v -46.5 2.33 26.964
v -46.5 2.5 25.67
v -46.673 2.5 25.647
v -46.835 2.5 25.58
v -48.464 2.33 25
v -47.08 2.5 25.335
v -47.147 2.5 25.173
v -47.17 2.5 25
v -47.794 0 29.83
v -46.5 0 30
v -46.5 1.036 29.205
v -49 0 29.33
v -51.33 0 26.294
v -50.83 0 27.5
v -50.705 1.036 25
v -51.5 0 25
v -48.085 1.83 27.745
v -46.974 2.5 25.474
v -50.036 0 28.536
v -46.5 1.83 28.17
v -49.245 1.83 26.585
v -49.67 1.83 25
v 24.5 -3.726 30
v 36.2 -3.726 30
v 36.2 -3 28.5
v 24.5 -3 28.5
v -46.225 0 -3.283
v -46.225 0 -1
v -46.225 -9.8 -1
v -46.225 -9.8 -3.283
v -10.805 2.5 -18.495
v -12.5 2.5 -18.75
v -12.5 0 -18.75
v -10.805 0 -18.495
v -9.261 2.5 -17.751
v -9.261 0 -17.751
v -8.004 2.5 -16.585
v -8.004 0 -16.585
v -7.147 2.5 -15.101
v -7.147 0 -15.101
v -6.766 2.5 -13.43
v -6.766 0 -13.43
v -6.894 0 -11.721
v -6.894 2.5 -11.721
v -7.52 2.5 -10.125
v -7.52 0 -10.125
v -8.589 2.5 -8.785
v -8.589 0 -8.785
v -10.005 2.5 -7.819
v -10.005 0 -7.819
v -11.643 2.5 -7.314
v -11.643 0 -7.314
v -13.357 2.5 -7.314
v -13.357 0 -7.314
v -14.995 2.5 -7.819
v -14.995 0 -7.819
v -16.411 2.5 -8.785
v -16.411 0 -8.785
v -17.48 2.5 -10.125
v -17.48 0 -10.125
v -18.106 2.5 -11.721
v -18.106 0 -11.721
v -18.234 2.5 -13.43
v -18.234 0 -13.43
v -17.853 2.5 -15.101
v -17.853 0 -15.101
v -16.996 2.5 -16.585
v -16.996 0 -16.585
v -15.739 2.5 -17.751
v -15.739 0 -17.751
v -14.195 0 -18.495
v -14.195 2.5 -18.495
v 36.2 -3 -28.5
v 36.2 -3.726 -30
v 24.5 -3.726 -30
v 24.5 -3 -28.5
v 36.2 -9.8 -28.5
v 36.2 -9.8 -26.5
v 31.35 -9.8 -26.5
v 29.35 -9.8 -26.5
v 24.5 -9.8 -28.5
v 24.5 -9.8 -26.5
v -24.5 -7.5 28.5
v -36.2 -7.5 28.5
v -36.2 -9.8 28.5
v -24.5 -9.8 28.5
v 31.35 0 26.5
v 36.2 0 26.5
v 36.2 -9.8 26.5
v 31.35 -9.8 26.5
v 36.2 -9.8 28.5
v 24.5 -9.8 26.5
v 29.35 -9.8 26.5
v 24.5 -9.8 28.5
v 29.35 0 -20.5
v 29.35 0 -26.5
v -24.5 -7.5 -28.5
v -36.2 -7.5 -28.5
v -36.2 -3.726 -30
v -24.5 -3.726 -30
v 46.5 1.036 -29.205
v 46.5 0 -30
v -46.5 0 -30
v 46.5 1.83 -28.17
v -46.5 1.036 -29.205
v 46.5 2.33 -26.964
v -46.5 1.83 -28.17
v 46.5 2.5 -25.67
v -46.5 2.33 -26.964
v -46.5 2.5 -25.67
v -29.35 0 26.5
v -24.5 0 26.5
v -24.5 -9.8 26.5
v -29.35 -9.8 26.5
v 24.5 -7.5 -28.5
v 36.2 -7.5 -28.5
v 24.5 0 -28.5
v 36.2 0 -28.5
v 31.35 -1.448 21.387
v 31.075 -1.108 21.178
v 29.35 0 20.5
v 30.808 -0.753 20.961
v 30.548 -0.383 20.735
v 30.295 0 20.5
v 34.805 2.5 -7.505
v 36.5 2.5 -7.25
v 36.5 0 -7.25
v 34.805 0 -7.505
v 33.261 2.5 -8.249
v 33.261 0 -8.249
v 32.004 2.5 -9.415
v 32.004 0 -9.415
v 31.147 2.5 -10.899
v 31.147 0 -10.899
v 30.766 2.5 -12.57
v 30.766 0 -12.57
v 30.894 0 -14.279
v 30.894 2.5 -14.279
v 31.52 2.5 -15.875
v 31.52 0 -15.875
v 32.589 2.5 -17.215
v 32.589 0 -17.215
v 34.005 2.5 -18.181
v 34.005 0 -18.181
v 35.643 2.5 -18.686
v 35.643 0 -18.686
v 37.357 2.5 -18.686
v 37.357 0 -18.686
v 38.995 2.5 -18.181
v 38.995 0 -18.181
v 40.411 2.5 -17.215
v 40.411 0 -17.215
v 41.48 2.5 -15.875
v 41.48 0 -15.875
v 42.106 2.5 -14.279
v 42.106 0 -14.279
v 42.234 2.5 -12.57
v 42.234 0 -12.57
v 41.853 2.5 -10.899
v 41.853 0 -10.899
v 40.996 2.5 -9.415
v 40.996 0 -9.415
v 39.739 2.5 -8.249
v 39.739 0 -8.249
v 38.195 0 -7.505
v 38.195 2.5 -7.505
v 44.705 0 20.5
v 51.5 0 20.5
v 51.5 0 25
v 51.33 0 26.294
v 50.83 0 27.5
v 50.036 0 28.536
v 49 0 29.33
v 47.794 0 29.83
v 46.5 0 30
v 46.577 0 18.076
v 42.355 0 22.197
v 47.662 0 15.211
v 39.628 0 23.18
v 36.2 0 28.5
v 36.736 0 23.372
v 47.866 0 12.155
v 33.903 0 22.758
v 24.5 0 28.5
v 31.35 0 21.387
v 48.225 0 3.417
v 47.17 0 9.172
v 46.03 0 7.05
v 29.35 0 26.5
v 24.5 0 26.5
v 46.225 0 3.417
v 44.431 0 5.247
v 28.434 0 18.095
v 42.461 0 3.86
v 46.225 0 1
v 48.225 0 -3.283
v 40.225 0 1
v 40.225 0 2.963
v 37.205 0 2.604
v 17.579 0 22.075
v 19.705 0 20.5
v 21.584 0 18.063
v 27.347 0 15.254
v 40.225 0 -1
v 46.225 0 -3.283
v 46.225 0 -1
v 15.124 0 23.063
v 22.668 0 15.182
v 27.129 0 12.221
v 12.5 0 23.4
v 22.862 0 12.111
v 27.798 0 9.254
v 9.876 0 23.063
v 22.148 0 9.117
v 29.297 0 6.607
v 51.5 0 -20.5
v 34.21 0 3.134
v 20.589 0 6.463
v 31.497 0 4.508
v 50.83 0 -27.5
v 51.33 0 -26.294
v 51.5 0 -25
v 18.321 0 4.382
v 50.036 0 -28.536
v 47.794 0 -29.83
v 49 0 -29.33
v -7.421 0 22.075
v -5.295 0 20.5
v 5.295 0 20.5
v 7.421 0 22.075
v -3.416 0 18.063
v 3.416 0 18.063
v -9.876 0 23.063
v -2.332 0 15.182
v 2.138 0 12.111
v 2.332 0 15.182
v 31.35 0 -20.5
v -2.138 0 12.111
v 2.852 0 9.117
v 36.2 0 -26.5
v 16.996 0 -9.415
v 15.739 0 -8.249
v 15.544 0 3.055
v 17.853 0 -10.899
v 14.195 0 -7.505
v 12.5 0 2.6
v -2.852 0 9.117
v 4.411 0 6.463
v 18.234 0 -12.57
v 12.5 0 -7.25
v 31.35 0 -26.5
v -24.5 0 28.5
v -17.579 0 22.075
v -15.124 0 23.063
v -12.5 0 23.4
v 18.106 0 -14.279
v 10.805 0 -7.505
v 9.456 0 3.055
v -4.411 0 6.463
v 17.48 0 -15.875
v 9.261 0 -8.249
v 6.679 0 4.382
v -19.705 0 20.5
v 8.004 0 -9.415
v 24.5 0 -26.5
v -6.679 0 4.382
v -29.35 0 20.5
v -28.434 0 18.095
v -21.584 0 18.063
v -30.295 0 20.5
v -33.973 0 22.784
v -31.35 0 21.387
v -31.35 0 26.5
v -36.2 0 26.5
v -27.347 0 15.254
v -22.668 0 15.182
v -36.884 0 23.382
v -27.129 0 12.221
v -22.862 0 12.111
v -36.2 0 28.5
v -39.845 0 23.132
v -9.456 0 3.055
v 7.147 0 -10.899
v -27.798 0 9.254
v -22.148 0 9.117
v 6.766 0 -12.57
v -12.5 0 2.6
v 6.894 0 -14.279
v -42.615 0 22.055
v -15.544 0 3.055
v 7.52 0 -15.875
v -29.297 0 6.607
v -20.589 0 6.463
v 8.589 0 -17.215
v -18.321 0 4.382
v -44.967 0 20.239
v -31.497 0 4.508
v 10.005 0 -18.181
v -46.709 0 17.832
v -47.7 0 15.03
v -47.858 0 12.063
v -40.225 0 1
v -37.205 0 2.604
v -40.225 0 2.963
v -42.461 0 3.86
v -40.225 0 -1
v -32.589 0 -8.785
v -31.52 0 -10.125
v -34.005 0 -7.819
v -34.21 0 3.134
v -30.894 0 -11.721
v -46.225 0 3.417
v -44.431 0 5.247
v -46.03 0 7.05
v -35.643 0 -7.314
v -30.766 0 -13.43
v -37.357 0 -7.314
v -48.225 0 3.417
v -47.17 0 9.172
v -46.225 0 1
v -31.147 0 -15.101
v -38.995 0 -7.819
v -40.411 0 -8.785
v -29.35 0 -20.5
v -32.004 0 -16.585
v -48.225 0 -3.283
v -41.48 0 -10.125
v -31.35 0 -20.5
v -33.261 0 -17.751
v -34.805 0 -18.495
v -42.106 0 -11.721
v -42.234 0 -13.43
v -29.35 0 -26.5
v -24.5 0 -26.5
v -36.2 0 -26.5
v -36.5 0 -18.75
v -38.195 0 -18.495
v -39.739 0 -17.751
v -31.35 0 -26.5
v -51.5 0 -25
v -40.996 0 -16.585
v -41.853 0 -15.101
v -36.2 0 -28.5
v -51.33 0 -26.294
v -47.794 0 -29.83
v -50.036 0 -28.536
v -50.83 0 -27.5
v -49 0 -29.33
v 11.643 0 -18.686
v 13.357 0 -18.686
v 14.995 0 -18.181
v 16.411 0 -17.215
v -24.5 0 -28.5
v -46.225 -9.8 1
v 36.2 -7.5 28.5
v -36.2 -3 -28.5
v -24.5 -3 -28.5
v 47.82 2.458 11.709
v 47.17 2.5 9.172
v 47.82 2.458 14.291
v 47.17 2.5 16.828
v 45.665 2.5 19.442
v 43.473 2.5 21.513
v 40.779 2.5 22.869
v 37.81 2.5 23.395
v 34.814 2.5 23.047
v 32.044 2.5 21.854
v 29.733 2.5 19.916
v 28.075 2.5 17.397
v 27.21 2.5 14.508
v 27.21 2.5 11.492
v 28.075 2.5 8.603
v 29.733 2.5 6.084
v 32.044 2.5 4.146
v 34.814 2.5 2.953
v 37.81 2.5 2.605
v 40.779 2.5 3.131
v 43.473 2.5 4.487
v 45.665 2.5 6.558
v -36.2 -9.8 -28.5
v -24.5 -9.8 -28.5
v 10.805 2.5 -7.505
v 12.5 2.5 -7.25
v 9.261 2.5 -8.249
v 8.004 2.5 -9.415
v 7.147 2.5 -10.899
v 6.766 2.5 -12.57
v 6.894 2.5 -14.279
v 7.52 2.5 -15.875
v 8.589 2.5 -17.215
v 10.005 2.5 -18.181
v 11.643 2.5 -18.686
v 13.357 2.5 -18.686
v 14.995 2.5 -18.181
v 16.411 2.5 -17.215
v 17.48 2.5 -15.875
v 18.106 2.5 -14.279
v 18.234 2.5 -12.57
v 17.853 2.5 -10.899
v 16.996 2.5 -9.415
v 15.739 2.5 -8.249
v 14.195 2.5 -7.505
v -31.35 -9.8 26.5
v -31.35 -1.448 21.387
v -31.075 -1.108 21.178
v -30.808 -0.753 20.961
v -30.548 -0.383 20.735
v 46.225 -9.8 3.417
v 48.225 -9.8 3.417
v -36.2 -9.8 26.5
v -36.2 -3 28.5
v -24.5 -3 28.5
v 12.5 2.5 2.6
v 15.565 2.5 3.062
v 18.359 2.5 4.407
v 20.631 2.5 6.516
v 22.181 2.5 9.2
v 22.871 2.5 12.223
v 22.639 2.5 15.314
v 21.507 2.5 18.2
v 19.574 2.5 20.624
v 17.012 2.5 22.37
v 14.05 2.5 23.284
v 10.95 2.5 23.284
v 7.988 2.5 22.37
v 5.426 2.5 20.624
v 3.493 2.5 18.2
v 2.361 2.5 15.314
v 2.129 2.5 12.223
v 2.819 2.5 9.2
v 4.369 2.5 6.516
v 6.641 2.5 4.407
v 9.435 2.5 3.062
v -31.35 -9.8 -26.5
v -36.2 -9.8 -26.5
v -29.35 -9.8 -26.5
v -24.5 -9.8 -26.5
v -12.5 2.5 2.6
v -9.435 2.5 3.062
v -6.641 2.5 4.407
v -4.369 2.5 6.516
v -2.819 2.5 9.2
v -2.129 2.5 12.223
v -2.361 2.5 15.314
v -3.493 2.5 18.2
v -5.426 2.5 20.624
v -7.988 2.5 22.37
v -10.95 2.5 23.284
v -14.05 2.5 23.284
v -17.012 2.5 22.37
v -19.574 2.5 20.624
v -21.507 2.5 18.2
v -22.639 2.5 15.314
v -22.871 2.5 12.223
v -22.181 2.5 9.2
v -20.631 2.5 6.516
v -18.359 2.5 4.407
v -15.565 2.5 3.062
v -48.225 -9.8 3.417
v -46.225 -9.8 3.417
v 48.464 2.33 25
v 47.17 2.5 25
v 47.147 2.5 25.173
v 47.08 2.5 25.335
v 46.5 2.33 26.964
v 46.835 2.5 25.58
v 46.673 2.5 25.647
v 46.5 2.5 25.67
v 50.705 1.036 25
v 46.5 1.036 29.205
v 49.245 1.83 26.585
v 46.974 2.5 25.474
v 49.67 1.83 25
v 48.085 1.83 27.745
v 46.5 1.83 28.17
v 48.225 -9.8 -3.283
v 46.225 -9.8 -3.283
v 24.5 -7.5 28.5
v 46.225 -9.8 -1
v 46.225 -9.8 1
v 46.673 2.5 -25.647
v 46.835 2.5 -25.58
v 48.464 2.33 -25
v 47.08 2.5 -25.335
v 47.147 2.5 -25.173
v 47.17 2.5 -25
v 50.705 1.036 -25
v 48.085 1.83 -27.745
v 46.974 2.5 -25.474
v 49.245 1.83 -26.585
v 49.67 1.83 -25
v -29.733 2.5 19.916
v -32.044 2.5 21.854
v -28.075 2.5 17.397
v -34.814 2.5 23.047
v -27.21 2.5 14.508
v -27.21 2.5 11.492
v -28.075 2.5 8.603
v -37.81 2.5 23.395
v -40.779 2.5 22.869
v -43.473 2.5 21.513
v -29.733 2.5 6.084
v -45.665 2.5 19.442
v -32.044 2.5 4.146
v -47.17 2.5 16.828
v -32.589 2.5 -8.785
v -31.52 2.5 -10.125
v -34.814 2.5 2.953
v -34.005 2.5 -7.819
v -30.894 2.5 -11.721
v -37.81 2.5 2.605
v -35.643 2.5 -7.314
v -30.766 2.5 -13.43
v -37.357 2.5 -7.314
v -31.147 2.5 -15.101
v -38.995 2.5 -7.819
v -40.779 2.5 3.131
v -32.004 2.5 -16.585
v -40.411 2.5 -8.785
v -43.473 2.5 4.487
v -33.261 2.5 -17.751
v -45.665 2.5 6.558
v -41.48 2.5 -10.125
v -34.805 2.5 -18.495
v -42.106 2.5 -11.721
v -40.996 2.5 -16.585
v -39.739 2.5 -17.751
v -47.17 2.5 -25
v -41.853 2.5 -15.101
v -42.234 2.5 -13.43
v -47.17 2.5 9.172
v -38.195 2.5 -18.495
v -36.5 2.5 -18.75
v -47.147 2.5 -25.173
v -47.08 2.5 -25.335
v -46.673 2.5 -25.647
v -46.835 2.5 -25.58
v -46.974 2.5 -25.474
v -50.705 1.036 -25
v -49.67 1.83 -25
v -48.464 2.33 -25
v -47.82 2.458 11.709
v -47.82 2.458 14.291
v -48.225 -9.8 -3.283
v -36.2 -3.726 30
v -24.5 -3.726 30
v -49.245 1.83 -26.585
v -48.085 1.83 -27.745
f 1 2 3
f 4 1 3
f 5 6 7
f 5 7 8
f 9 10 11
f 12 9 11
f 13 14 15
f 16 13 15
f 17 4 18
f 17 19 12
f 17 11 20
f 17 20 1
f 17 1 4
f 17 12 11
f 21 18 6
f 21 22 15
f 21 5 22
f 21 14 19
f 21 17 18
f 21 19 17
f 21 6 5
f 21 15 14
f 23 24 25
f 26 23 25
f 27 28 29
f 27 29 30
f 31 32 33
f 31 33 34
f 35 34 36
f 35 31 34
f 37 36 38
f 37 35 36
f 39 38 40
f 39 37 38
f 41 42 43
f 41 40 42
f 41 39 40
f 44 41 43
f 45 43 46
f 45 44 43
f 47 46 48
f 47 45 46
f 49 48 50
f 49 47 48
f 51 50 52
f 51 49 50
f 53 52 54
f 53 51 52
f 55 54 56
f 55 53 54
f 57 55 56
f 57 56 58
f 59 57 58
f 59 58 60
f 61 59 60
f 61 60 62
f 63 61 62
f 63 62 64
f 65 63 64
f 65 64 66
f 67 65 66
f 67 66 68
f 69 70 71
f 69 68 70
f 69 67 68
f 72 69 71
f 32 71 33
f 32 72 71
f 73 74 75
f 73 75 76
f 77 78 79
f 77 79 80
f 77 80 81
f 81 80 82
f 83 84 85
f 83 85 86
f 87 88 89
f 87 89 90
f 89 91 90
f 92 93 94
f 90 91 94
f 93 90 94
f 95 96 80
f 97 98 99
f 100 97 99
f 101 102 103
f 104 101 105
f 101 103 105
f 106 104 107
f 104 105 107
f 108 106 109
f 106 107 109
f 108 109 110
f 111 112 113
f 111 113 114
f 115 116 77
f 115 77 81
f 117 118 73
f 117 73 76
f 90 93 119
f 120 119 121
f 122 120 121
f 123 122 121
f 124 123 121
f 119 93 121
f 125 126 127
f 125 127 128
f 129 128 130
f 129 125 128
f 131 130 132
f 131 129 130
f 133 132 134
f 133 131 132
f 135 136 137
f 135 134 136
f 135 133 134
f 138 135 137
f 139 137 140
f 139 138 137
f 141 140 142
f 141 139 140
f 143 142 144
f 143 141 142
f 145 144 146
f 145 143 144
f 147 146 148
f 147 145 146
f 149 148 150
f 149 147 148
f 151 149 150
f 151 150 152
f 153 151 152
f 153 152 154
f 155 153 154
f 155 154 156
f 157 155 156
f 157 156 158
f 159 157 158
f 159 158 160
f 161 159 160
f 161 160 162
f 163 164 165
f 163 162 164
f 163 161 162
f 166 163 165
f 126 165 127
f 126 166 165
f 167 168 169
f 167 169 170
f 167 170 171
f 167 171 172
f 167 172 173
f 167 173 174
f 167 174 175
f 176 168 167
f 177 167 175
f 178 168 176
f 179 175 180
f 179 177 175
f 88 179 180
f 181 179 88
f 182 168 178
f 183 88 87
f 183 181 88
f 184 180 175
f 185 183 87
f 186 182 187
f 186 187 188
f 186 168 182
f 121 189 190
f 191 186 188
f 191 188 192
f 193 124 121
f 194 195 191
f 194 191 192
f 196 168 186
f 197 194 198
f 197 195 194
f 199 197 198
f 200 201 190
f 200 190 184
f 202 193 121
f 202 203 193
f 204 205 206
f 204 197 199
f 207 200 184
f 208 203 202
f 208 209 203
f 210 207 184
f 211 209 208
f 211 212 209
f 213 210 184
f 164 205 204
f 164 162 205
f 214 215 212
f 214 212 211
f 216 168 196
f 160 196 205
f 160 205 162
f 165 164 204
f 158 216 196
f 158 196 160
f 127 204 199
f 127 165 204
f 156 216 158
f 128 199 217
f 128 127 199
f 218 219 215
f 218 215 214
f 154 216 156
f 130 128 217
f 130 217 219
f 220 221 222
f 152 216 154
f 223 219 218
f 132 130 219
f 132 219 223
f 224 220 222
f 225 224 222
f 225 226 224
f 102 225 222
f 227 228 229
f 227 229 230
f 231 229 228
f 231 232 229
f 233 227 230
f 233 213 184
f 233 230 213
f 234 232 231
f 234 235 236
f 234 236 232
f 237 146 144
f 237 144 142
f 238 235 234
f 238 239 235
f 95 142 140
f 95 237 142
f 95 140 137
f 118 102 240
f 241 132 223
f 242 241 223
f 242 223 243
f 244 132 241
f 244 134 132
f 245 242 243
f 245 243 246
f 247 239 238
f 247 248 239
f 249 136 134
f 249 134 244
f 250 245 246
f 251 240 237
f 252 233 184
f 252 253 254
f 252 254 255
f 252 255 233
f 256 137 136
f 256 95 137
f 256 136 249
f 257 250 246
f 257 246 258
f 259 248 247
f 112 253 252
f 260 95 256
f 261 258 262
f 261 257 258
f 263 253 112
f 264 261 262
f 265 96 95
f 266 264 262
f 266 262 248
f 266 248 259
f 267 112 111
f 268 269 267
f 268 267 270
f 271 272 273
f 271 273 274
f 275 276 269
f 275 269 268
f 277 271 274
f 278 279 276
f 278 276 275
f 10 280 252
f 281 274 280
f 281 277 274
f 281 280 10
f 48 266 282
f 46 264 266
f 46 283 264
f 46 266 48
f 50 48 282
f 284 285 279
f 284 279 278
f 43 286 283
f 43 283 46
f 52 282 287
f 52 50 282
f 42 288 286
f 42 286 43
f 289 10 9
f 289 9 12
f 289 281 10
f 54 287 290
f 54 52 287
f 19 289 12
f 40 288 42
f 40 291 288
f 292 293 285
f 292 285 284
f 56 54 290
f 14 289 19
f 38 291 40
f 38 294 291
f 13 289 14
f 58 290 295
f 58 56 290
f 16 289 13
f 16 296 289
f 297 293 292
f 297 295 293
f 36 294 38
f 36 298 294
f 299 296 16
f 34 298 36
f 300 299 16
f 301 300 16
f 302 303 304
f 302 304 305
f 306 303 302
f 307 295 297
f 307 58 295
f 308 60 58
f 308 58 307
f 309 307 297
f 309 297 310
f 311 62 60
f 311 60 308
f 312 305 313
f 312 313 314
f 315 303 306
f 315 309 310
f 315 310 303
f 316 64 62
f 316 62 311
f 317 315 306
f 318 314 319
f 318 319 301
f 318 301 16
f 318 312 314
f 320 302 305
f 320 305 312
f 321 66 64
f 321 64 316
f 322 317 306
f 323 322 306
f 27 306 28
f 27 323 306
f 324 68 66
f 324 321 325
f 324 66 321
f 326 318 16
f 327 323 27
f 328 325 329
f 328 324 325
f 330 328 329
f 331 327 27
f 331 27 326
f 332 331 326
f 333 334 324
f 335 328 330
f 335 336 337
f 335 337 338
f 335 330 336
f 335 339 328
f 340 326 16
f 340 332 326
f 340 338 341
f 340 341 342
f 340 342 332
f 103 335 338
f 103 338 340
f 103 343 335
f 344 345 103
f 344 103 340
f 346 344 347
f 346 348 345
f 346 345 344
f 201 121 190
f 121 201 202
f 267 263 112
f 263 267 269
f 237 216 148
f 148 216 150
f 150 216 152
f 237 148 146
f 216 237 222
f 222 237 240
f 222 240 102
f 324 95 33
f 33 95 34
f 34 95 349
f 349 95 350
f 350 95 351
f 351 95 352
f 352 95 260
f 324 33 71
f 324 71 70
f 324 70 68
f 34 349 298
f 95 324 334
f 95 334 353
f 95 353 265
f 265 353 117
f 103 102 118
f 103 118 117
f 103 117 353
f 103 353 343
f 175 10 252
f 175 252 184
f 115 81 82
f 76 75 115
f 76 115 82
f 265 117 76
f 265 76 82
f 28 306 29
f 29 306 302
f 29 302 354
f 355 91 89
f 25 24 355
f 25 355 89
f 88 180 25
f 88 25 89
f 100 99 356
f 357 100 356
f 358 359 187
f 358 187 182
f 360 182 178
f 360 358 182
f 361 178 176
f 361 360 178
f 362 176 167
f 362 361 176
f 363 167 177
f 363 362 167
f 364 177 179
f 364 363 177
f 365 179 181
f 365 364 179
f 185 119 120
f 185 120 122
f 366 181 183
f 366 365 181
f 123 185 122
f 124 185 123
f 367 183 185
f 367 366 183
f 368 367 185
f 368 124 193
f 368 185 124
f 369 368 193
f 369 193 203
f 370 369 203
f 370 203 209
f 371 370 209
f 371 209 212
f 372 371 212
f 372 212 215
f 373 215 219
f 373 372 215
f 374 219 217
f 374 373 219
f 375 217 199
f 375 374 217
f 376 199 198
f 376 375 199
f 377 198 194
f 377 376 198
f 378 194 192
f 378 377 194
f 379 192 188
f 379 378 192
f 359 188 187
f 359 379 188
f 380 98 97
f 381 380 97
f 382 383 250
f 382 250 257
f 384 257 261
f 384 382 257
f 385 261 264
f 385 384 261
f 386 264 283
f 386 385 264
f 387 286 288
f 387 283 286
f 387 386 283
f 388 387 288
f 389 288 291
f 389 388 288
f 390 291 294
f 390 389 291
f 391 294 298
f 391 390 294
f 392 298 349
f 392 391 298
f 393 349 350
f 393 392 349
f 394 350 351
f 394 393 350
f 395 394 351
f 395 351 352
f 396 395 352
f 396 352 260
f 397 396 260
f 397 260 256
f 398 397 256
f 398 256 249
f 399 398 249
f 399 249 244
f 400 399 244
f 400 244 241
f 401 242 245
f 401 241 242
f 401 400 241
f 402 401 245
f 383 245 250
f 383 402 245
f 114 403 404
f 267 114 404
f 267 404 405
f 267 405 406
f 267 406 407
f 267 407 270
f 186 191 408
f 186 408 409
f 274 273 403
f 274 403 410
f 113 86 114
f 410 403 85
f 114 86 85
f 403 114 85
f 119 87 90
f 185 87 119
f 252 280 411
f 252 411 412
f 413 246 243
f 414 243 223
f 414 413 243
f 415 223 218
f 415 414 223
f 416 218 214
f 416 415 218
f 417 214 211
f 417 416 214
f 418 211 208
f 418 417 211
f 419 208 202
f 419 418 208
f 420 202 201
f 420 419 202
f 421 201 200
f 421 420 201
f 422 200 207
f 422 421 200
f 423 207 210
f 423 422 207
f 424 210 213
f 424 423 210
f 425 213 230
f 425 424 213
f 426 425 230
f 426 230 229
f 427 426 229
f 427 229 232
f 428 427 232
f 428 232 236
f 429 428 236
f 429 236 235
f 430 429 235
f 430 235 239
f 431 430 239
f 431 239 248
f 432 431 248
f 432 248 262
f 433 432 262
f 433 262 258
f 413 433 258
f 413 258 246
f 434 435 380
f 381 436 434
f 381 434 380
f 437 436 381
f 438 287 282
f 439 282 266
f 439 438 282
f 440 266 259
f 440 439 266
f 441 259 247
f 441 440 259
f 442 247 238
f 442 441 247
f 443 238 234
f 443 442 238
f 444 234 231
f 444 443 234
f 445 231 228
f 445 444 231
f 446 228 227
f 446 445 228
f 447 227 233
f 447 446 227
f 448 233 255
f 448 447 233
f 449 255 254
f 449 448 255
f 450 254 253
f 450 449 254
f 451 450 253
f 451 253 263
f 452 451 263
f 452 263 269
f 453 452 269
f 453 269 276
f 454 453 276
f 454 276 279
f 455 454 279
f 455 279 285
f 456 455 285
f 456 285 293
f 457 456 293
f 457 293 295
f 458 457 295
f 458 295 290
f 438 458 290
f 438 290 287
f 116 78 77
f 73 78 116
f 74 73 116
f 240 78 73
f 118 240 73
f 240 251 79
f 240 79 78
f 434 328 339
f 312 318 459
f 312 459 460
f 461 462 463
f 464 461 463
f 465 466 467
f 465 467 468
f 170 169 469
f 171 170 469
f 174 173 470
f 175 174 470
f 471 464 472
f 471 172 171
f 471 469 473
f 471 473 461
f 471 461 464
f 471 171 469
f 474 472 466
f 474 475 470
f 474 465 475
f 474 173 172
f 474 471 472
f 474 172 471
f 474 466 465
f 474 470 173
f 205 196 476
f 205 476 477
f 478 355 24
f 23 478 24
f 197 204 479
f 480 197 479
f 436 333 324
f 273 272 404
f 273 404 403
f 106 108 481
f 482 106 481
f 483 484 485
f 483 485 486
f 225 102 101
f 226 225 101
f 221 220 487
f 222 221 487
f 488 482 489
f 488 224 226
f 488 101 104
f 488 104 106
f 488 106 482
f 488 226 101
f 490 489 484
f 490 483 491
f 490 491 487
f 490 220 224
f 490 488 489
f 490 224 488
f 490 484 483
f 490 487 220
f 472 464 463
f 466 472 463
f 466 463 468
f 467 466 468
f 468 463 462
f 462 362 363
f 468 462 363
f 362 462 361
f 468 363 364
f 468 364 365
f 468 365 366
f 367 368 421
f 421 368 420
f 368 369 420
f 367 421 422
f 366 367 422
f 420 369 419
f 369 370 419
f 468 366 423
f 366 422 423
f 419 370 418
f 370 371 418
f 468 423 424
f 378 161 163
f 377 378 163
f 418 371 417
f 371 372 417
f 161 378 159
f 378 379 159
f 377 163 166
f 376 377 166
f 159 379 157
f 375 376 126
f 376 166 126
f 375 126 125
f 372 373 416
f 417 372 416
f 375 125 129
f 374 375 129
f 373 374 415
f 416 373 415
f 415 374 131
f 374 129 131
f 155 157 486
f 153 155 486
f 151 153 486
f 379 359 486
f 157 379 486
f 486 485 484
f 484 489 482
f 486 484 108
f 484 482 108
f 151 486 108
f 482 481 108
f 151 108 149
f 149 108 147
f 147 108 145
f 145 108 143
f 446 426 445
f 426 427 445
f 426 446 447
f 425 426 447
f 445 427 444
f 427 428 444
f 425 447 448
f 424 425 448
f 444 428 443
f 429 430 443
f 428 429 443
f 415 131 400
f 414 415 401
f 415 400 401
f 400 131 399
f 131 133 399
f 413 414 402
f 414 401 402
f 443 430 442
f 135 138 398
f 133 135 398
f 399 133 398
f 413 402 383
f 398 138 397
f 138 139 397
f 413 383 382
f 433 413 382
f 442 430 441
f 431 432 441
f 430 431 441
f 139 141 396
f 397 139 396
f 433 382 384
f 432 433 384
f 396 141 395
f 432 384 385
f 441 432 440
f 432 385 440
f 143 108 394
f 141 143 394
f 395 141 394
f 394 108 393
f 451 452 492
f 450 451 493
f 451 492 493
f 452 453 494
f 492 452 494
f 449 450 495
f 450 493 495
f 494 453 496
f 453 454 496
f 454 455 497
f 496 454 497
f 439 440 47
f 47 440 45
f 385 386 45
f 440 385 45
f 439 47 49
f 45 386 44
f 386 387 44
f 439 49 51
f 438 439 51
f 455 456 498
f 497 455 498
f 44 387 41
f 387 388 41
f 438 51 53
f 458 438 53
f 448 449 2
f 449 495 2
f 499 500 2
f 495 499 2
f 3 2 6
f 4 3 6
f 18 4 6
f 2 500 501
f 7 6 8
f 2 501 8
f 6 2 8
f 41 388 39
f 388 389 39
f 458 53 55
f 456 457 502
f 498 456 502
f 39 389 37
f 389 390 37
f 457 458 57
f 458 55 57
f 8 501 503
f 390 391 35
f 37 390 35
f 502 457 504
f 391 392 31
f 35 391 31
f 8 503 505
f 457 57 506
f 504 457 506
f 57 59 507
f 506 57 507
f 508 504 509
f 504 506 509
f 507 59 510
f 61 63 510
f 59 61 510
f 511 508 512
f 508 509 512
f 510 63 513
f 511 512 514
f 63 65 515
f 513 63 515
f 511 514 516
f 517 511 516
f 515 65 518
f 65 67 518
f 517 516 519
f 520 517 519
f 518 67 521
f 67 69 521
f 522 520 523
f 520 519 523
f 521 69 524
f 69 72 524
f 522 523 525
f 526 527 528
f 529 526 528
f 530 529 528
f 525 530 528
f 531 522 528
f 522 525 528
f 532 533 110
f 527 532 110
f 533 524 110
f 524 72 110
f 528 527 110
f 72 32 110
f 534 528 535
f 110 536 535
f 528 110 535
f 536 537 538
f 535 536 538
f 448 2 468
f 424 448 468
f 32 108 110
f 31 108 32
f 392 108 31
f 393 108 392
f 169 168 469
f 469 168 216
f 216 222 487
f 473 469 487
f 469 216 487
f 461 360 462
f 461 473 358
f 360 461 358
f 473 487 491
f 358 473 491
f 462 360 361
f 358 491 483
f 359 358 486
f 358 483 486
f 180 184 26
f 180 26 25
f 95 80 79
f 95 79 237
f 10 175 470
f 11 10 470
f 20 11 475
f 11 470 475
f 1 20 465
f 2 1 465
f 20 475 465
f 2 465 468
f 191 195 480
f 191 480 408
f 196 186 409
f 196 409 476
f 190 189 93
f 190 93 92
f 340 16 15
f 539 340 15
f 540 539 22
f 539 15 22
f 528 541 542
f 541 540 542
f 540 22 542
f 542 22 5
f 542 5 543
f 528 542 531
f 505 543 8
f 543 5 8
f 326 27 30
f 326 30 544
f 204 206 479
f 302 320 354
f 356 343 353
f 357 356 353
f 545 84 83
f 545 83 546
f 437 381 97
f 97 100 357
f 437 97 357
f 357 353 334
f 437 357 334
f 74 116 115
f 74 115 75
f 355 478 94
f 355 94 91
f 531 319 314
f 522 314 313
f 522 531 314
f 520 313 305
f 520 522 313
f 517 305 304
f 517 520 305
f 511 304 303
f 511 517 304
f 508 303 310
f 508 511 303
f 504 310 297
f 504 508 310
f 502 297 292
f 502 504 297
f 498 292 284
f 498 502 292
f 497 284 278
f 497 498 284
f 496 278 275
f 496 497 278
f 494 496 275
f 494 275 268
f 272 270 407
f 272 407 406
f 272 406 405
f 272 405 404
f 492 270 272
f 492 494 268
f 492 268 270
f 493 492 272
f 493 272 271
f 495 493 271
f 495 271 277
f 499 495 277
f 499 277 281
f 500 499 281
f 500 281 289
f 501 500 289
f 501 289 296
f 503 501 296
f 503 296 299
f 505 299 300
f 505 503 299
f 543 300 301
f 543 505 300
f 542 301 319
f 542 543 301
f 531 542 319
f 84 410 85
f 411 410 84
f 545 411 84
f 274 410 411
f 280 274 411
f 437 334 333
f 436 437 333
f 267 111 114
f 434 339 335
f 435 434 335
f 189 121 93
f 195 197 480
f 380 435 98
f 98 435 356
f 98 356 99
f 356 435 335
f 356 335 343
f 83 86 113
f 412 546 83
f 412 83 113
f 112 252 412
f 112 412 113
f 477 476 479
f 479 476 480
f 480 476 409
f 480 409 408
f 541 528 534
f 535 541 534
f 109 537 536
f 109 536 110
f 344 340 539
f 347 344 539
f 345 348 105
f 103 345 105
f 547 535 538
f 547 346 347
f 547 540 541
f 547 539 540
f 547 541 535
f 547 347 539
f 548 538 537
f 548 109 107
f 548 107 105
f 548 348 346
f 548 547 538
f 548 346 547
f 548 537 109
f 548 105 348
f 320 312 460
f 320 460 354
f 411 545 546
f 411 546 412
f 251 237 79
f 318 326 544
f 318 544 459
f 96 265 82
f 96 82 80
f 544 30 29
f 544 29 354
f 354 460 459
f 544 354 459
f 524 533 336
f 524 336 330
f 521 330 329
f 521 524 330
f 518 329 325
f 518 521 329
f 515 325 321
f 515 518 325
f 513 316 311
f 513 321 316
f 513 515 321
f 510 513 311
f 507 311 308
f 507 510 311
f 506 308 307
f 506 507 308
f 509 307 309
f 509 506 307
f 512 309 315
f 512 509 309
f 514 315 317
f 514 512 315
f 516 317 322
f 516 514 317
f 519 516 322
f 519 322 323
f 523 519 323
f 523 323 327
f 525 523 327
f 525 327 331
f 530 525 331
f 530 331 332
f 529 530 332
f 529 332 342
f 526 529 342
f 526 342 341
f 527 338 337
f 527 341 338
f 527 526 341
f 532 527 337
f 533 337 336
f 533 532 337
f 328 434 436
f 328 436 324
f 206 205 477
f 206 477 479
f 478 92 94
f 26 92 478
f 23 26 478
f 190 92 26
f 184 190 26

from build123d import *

# Parameters (mm, degrees)
BOSS_EXTRUDE1_DEPTH     = 2.5
FILLET1_R               = 5
BOSS_EXTRUDE2_DEPTH     = 9.8
CUT_EXTRUDE1_DEPTH      = 9.8
CUT_EXTRUDE2_DEPTH      = 89.657557489
BOSS_EXTRUDE3_DEPTH     = 11.7
MIRROR4_COPY_1_DEPTH    = 11.7
CUT_EXTRUDE3_DEPTH      = 61.401076149
CUT_EXTRUDE3_DEPTH_BACK = 61.401076149
SKETCH7_R               = 10.4
SKETCH7_R_2             = 5.75


with BuildPart() as part:
    # Sketch1 → Boss-Extrude1 (new body)
    with BuildSketch(Plane(origin=(0, 0, 0), x_dir=(1, 0, 0), z_dir=(0, 1, 0))):
        with BuildLine():
            Line((-46.5, 30), (46.5, 30))
            ThreePointArc((46.5, 30), (50.035533906, 28.535533906), (51.5, 25))
            Line((51.5, 25), (51.5, -25))
            ThreePointArc((51.5, -25), (50.035533906, -28.535533906), (46.5, -30))
            Line((46.5, -30), (-46.5, -30))
            ThreePointArc((-46.5, -30), (-50.035533906, -28.535533906), (-51.5, -25))
            Line((-51.5, -25), (-51.5, 25))
            ThreePointArc((-51.5, 25), (-50.035533906, 28.535533906), (-46.5, 30))
        make_face()
    extrude(amount=BOSS_EXTRUDE1_DEPTH)

    # Fillet1
    # the kernel refuses this fillet: 5 mm, written as the material it takes off along each edge
    with BuildSketch(Plane(origin=(-46.5, 2.5, -25), x_dir=(-1, 0, 0), z_dir=(0, 0, 1))) as fillet1_piece_1:
        with BuildLine():
            CenterArc((0.669872981, 5), FILLET1_R, 270, 60)
            Line((0.669872981, 0), (0.669872981, -0.1))
            Line((0.669872981, -0.1), (5, -0.1))
            Line((5, -0.1), (5.1, 0))
            ThreePointArc((5.1, 0), (5.1, 1.25), (5.08660254, 2.45))
            Line((5.08660254, 2.45), (5, 2.5))
        make_face()
    revolve(axis=Axis((-46.5, 2.5, -25), (0, -1, 0)), revolution_arc=90, mode=Mode.SUBTRACT)
    with BuildSketch(Plane(origin=(-46.5, 2.5, -30), x_dir=(0, -1, 0), z_dir=(1, 0, 0)), Plane(origin=(46.5, 2.5, 30), x_dir=(0, -1, 0), z_dir=(-1, 0, 0))) as fillet1_piece_2:
        with BuildLine():
            CenterArc((5, -4.330127019), FILLET1_R, 120, 60)
            Line((0, -4.330127019), (-0.1, -4.330127019))
            Line((-0.1, -4.330127019), (-0.1, 0))
            Line((-0.1, 0), (0, 0.1))
            ThreePointArc((0, 0.1), (1.25, 0.1), (2.45, 0.08660254))
            Line((2.45, 0.08660254), (2.5, 0))
        make_face()
    extrude(amount=93, mode=Mode.SUBTRACT)
    with BuildSketch(Plane(origin=(46.5, 2.5, -25), x_dir=(0, 0, -1), z_dir=(-1, 0, 0))) as fillet1_piece_3:
        with BuildLine():
            CenterArc((0.669872981, 5), FILLET1_R, 270, 60)
            Line((0.669872981, 0), (0.669872981, -0.1))
            Line((0.669872981, -0.1), (5, -0.1))
            Line((5, -0.1), (5.1, 0))
            ThreePointArc((5.1, 0), (5.1, 1.25), (5.08660254, 2.45))
            Line((5.08660254, 2.45), (5, 2.5))
        make_face()
    revolve(axis=Axis((46.5, 2.5, -25), (0, -1, 0)), revolution_arc=90, mode=Mode.SUBTRACT)
    with BuildSketch(Plane(origin=(51.5, 2.5, -25), x_dir=(0, -1, 0), z_dir=(0, 0, 1)), Plane(origin=(-51.5, 2.5, 25), x_dir=(0, -1, 0), z_dir=(0, 0, -1))) as fillet1_piece_4:
        with BuildLine():
            CenterArc((5, -4.330127019), FILLET1_R, 120, 60)
            Line((0, -4.330127019), (-0.1, -4.330127019))
            Line((-0.1, -4.330127019), (-0.1, 0))
            Line((-0.1, 0), (0, 0.1))
            ThreePointArc((0, 0.1), (1.25, 0.1), (2.45, 0.08660254))
            Line((2.45, 0.08660254), (2.5, 0))
        make_face()
    extrude(amount=50, mode=Mode.SUBTRACT)
    with BuildSketch(Plane(origin=(46.5, 2.5, 25), x_dir=(1, 0, 0), z_dir=(0, 0, -1))) as fillet1_piece_5:
        with BuildLine():
            CenterArc((0.669872981, 5), FILLET1_R, 270, 60)
            Line((0.669872981, 0), (0.669872981, -0.1))
            Line((0.669872981, -0.1), (5, -0.1))
            Line((5, -0.1), (5.1, 0))
            ThreePointArc((5.1, 0), (5.1, 1.25), (5.08660254, 2.45))
            Line((5.08660254, 2.45), (5, 2.5))
        make_face()
    revolve(axis=Axis((46.5, 2.5, 25), (0, -1, 0)), revolution_arc=90, mode=Mode.SUBTRACT)
    with BuildSketch(Plane(origin=(-46.5, 2.5, 25), x_dir=(0, 0, 1), z_dir=(1, 0, 0))) as fillet1_piece_6:
        with BuildLine():
            CenterArc((0.669872981, 5), FILLET1_R, 270, 60)
            Line((0.669872981, 0), (0.669872981, -0.1))
            Line((0.669872981, -0.1), (5, -0.1))
            Line((5, -0.1), (5.1, 0))
            ThreePointArc((5.1, 0), (5.1, 1.25), (5.08660254, 2.45))
            Line((5.08660254, 2.45), (5, 2.5))
        make_face()
    revolve(axis=Axis((-46.5, 2.5, 25), (0, -1, 0)), revolution_arc=90, mode=Mode.SUBTRACT)

    # Sketch2 → Boss-Extrude2 (add)
    with BuildSketch(Plane.XZ):
        Polygon((-36.2, 28.5), (-24.5, 28.5), (-24.5, 26.5), (-29.35, 26.5), (-29.35, 20.5), (-31.35, 20.5), (-31.35, 26.5), (-36.2, 26.5), align=None)
        Polygon((48.225, -3.282847821), (46.225, -3.282847821), (46.225, -0.999790058), (40.225, -0.999790058), (40.225, 1), (46.225, 1), (46.225, 3.417152179), (48.225, 3.417152179), align=None)
        Polygon((24.5, 28.5), (36.2, 28.5), (36.2, 26.5), (31.35, 26.5), (31.35, 20.5), (29.35, 20.5), (29.35, 26.5), (24.5, 26.5), align=None)
        Polygon((24.5, -26.5), (29.35, -26.5), (29.35, -20.5), (31.35, -20.5), (31.35, -26.5), (36.2, -26.5), (36.2, -28.5), (24.5, -28.5), align=None)
        Polygon((-36.2, -28.5), (-24.5, -28.5), (-24.5, -26.5), (-29.35, -26.5), (-29.35, -20.5), (-31.35, -20.5), (-31.35, -26.5), (-36.2, -26.5), align=None)
        Polygon((-48.225, 3.417152179), (-46.225, 3.417152179), (-46.225, 1), (-40.225, 1), (-40.225, -0.999790058), (-46.225, -0.999790058), (-46.225, -3.282847821), (-48.225, -3.282847821), align=None)
    extrude(amount=BOSS_EXTRUDE2_DEPTH)

    # Sketch4 → Cut-Extrude1 (cut)
    with BuildSketch(Plane(origin=(0, 0, -0.999790058), x_dir=(-1, 0, 0), z_dir=(0, 0, -1))):
        Polygon((40.225, 0), (46.225, -9.8), (40.225, -9.8), align=None)
    cut_extrude1 = extrude(amount=-CUT_EXTRUDE1_DEPTH, mode=Mode.SUBTRACT)

    # Mirror1: Cut-Extrude1 across plane
    add(cut_extrude1.mirror(Plane(origin=(0, 0, 0), x_dir=(0, 0, 1), z_dir=(1, 0, 0))), mode=Mode.SUBTRACT)

    # Sketch5 → Cut-Extrude2 (cut, through all)
    with BuildSketch(Plane.ZY.offset(31.35)):
        Polygon((-26.5, -9.8), (-20.5, 0), (-20.5, -9.8), align=None)
    cut_extrude2 = extrude(amount=-CUT_EXTRUDE2_DEPTH, mode=Mode.SUBTRACT)

    # Mirror2: Cut-Extrude2 across plane
    add(cut_extrude2.mirror(Plane.XY), mode=Mode.SUBTRACT)

    # Sketch6 → Boss-Extrude3 (add)
    with BuildSketch(Plane(origin=(36.2, 0, 0), x_dir=(0, 0, -1), z_dir=(1, 0, 0))):
        Polygon((-28.5, -3), (-28.5, -7.5), (-30, -3.726144837), align=None)
    boss_extrude3 = extrude(amount=-BOSS_EXTRUDE3_DEPTH)

    # Mirror3: Boss-Extrude3 across plane
    add(boss_extrude3.mirror(Plane(origin=(0, 0, 0), x_dir=(0, 0, 1), z_dir=(1, 0, 0))))

    # Mirror4: Boss-Extrude3 across plane
    add(boss_extrude3.mirror(Plane.XY))

    # Mirror4 copy 1 sketch → Mirror4 copy 1 (add)
    with BuildSketch(Plane.ZY.offset(36.2)):
        Polygon((-28.5, -3), (-28.5, -7.5), (-30, -3.726144837), align=None)
    extrude(amount=-MIRROR4_COPY_1_DEPTH)

    # Sketch7 → Cut-Extrude3 (cut, two sides: drawn at the far end of the back side and taken through both)
    with BuildSketch(Plane.XZ.offset(-CUT_EXTRUDE3_DEPTH_BACK)):
        with Locations(Location((-37.5, 13, 0), (0, 0, 201.597043682))):
            Circle(SKETCH7_R)
        with Locations(Location((-12.5, 13, 0), (0, 0, 270))):
            Circle(SKETCH7_R)
        with Locations(Location((-36.5, -13, 0), (0, 0, 270))):
            Circle(SKETCH7_R_2)
        with Locations(Location((12.5, 13, 0), (0, 0, 270))):
            Circle(SKETCH7_R)
        with Locations(Location((37.5, 13, 0), (0, 0, 338.402956318))):
            Circle(SKETCH7_R)
        with Locations(Location((-12.5, -13, 0), (0, 0, 270))):
            Circle(SKETCH7_R_2)
        with Locations(Location((12.5, -13, 0), (0, 0, 90))):
            Circle(SKETCH7_R_2)
        with Locations(Location((36.5, -13, 0), (0, 0, 90))):
            Circle(SKETCH7_R_2)
    extrude(amount=CUT_EXTRUDE3_DEPTH + CUT_EXTRUDE3_DEPTH_BACK, mode=Mode.SUBTRACT)


solid = part.part
